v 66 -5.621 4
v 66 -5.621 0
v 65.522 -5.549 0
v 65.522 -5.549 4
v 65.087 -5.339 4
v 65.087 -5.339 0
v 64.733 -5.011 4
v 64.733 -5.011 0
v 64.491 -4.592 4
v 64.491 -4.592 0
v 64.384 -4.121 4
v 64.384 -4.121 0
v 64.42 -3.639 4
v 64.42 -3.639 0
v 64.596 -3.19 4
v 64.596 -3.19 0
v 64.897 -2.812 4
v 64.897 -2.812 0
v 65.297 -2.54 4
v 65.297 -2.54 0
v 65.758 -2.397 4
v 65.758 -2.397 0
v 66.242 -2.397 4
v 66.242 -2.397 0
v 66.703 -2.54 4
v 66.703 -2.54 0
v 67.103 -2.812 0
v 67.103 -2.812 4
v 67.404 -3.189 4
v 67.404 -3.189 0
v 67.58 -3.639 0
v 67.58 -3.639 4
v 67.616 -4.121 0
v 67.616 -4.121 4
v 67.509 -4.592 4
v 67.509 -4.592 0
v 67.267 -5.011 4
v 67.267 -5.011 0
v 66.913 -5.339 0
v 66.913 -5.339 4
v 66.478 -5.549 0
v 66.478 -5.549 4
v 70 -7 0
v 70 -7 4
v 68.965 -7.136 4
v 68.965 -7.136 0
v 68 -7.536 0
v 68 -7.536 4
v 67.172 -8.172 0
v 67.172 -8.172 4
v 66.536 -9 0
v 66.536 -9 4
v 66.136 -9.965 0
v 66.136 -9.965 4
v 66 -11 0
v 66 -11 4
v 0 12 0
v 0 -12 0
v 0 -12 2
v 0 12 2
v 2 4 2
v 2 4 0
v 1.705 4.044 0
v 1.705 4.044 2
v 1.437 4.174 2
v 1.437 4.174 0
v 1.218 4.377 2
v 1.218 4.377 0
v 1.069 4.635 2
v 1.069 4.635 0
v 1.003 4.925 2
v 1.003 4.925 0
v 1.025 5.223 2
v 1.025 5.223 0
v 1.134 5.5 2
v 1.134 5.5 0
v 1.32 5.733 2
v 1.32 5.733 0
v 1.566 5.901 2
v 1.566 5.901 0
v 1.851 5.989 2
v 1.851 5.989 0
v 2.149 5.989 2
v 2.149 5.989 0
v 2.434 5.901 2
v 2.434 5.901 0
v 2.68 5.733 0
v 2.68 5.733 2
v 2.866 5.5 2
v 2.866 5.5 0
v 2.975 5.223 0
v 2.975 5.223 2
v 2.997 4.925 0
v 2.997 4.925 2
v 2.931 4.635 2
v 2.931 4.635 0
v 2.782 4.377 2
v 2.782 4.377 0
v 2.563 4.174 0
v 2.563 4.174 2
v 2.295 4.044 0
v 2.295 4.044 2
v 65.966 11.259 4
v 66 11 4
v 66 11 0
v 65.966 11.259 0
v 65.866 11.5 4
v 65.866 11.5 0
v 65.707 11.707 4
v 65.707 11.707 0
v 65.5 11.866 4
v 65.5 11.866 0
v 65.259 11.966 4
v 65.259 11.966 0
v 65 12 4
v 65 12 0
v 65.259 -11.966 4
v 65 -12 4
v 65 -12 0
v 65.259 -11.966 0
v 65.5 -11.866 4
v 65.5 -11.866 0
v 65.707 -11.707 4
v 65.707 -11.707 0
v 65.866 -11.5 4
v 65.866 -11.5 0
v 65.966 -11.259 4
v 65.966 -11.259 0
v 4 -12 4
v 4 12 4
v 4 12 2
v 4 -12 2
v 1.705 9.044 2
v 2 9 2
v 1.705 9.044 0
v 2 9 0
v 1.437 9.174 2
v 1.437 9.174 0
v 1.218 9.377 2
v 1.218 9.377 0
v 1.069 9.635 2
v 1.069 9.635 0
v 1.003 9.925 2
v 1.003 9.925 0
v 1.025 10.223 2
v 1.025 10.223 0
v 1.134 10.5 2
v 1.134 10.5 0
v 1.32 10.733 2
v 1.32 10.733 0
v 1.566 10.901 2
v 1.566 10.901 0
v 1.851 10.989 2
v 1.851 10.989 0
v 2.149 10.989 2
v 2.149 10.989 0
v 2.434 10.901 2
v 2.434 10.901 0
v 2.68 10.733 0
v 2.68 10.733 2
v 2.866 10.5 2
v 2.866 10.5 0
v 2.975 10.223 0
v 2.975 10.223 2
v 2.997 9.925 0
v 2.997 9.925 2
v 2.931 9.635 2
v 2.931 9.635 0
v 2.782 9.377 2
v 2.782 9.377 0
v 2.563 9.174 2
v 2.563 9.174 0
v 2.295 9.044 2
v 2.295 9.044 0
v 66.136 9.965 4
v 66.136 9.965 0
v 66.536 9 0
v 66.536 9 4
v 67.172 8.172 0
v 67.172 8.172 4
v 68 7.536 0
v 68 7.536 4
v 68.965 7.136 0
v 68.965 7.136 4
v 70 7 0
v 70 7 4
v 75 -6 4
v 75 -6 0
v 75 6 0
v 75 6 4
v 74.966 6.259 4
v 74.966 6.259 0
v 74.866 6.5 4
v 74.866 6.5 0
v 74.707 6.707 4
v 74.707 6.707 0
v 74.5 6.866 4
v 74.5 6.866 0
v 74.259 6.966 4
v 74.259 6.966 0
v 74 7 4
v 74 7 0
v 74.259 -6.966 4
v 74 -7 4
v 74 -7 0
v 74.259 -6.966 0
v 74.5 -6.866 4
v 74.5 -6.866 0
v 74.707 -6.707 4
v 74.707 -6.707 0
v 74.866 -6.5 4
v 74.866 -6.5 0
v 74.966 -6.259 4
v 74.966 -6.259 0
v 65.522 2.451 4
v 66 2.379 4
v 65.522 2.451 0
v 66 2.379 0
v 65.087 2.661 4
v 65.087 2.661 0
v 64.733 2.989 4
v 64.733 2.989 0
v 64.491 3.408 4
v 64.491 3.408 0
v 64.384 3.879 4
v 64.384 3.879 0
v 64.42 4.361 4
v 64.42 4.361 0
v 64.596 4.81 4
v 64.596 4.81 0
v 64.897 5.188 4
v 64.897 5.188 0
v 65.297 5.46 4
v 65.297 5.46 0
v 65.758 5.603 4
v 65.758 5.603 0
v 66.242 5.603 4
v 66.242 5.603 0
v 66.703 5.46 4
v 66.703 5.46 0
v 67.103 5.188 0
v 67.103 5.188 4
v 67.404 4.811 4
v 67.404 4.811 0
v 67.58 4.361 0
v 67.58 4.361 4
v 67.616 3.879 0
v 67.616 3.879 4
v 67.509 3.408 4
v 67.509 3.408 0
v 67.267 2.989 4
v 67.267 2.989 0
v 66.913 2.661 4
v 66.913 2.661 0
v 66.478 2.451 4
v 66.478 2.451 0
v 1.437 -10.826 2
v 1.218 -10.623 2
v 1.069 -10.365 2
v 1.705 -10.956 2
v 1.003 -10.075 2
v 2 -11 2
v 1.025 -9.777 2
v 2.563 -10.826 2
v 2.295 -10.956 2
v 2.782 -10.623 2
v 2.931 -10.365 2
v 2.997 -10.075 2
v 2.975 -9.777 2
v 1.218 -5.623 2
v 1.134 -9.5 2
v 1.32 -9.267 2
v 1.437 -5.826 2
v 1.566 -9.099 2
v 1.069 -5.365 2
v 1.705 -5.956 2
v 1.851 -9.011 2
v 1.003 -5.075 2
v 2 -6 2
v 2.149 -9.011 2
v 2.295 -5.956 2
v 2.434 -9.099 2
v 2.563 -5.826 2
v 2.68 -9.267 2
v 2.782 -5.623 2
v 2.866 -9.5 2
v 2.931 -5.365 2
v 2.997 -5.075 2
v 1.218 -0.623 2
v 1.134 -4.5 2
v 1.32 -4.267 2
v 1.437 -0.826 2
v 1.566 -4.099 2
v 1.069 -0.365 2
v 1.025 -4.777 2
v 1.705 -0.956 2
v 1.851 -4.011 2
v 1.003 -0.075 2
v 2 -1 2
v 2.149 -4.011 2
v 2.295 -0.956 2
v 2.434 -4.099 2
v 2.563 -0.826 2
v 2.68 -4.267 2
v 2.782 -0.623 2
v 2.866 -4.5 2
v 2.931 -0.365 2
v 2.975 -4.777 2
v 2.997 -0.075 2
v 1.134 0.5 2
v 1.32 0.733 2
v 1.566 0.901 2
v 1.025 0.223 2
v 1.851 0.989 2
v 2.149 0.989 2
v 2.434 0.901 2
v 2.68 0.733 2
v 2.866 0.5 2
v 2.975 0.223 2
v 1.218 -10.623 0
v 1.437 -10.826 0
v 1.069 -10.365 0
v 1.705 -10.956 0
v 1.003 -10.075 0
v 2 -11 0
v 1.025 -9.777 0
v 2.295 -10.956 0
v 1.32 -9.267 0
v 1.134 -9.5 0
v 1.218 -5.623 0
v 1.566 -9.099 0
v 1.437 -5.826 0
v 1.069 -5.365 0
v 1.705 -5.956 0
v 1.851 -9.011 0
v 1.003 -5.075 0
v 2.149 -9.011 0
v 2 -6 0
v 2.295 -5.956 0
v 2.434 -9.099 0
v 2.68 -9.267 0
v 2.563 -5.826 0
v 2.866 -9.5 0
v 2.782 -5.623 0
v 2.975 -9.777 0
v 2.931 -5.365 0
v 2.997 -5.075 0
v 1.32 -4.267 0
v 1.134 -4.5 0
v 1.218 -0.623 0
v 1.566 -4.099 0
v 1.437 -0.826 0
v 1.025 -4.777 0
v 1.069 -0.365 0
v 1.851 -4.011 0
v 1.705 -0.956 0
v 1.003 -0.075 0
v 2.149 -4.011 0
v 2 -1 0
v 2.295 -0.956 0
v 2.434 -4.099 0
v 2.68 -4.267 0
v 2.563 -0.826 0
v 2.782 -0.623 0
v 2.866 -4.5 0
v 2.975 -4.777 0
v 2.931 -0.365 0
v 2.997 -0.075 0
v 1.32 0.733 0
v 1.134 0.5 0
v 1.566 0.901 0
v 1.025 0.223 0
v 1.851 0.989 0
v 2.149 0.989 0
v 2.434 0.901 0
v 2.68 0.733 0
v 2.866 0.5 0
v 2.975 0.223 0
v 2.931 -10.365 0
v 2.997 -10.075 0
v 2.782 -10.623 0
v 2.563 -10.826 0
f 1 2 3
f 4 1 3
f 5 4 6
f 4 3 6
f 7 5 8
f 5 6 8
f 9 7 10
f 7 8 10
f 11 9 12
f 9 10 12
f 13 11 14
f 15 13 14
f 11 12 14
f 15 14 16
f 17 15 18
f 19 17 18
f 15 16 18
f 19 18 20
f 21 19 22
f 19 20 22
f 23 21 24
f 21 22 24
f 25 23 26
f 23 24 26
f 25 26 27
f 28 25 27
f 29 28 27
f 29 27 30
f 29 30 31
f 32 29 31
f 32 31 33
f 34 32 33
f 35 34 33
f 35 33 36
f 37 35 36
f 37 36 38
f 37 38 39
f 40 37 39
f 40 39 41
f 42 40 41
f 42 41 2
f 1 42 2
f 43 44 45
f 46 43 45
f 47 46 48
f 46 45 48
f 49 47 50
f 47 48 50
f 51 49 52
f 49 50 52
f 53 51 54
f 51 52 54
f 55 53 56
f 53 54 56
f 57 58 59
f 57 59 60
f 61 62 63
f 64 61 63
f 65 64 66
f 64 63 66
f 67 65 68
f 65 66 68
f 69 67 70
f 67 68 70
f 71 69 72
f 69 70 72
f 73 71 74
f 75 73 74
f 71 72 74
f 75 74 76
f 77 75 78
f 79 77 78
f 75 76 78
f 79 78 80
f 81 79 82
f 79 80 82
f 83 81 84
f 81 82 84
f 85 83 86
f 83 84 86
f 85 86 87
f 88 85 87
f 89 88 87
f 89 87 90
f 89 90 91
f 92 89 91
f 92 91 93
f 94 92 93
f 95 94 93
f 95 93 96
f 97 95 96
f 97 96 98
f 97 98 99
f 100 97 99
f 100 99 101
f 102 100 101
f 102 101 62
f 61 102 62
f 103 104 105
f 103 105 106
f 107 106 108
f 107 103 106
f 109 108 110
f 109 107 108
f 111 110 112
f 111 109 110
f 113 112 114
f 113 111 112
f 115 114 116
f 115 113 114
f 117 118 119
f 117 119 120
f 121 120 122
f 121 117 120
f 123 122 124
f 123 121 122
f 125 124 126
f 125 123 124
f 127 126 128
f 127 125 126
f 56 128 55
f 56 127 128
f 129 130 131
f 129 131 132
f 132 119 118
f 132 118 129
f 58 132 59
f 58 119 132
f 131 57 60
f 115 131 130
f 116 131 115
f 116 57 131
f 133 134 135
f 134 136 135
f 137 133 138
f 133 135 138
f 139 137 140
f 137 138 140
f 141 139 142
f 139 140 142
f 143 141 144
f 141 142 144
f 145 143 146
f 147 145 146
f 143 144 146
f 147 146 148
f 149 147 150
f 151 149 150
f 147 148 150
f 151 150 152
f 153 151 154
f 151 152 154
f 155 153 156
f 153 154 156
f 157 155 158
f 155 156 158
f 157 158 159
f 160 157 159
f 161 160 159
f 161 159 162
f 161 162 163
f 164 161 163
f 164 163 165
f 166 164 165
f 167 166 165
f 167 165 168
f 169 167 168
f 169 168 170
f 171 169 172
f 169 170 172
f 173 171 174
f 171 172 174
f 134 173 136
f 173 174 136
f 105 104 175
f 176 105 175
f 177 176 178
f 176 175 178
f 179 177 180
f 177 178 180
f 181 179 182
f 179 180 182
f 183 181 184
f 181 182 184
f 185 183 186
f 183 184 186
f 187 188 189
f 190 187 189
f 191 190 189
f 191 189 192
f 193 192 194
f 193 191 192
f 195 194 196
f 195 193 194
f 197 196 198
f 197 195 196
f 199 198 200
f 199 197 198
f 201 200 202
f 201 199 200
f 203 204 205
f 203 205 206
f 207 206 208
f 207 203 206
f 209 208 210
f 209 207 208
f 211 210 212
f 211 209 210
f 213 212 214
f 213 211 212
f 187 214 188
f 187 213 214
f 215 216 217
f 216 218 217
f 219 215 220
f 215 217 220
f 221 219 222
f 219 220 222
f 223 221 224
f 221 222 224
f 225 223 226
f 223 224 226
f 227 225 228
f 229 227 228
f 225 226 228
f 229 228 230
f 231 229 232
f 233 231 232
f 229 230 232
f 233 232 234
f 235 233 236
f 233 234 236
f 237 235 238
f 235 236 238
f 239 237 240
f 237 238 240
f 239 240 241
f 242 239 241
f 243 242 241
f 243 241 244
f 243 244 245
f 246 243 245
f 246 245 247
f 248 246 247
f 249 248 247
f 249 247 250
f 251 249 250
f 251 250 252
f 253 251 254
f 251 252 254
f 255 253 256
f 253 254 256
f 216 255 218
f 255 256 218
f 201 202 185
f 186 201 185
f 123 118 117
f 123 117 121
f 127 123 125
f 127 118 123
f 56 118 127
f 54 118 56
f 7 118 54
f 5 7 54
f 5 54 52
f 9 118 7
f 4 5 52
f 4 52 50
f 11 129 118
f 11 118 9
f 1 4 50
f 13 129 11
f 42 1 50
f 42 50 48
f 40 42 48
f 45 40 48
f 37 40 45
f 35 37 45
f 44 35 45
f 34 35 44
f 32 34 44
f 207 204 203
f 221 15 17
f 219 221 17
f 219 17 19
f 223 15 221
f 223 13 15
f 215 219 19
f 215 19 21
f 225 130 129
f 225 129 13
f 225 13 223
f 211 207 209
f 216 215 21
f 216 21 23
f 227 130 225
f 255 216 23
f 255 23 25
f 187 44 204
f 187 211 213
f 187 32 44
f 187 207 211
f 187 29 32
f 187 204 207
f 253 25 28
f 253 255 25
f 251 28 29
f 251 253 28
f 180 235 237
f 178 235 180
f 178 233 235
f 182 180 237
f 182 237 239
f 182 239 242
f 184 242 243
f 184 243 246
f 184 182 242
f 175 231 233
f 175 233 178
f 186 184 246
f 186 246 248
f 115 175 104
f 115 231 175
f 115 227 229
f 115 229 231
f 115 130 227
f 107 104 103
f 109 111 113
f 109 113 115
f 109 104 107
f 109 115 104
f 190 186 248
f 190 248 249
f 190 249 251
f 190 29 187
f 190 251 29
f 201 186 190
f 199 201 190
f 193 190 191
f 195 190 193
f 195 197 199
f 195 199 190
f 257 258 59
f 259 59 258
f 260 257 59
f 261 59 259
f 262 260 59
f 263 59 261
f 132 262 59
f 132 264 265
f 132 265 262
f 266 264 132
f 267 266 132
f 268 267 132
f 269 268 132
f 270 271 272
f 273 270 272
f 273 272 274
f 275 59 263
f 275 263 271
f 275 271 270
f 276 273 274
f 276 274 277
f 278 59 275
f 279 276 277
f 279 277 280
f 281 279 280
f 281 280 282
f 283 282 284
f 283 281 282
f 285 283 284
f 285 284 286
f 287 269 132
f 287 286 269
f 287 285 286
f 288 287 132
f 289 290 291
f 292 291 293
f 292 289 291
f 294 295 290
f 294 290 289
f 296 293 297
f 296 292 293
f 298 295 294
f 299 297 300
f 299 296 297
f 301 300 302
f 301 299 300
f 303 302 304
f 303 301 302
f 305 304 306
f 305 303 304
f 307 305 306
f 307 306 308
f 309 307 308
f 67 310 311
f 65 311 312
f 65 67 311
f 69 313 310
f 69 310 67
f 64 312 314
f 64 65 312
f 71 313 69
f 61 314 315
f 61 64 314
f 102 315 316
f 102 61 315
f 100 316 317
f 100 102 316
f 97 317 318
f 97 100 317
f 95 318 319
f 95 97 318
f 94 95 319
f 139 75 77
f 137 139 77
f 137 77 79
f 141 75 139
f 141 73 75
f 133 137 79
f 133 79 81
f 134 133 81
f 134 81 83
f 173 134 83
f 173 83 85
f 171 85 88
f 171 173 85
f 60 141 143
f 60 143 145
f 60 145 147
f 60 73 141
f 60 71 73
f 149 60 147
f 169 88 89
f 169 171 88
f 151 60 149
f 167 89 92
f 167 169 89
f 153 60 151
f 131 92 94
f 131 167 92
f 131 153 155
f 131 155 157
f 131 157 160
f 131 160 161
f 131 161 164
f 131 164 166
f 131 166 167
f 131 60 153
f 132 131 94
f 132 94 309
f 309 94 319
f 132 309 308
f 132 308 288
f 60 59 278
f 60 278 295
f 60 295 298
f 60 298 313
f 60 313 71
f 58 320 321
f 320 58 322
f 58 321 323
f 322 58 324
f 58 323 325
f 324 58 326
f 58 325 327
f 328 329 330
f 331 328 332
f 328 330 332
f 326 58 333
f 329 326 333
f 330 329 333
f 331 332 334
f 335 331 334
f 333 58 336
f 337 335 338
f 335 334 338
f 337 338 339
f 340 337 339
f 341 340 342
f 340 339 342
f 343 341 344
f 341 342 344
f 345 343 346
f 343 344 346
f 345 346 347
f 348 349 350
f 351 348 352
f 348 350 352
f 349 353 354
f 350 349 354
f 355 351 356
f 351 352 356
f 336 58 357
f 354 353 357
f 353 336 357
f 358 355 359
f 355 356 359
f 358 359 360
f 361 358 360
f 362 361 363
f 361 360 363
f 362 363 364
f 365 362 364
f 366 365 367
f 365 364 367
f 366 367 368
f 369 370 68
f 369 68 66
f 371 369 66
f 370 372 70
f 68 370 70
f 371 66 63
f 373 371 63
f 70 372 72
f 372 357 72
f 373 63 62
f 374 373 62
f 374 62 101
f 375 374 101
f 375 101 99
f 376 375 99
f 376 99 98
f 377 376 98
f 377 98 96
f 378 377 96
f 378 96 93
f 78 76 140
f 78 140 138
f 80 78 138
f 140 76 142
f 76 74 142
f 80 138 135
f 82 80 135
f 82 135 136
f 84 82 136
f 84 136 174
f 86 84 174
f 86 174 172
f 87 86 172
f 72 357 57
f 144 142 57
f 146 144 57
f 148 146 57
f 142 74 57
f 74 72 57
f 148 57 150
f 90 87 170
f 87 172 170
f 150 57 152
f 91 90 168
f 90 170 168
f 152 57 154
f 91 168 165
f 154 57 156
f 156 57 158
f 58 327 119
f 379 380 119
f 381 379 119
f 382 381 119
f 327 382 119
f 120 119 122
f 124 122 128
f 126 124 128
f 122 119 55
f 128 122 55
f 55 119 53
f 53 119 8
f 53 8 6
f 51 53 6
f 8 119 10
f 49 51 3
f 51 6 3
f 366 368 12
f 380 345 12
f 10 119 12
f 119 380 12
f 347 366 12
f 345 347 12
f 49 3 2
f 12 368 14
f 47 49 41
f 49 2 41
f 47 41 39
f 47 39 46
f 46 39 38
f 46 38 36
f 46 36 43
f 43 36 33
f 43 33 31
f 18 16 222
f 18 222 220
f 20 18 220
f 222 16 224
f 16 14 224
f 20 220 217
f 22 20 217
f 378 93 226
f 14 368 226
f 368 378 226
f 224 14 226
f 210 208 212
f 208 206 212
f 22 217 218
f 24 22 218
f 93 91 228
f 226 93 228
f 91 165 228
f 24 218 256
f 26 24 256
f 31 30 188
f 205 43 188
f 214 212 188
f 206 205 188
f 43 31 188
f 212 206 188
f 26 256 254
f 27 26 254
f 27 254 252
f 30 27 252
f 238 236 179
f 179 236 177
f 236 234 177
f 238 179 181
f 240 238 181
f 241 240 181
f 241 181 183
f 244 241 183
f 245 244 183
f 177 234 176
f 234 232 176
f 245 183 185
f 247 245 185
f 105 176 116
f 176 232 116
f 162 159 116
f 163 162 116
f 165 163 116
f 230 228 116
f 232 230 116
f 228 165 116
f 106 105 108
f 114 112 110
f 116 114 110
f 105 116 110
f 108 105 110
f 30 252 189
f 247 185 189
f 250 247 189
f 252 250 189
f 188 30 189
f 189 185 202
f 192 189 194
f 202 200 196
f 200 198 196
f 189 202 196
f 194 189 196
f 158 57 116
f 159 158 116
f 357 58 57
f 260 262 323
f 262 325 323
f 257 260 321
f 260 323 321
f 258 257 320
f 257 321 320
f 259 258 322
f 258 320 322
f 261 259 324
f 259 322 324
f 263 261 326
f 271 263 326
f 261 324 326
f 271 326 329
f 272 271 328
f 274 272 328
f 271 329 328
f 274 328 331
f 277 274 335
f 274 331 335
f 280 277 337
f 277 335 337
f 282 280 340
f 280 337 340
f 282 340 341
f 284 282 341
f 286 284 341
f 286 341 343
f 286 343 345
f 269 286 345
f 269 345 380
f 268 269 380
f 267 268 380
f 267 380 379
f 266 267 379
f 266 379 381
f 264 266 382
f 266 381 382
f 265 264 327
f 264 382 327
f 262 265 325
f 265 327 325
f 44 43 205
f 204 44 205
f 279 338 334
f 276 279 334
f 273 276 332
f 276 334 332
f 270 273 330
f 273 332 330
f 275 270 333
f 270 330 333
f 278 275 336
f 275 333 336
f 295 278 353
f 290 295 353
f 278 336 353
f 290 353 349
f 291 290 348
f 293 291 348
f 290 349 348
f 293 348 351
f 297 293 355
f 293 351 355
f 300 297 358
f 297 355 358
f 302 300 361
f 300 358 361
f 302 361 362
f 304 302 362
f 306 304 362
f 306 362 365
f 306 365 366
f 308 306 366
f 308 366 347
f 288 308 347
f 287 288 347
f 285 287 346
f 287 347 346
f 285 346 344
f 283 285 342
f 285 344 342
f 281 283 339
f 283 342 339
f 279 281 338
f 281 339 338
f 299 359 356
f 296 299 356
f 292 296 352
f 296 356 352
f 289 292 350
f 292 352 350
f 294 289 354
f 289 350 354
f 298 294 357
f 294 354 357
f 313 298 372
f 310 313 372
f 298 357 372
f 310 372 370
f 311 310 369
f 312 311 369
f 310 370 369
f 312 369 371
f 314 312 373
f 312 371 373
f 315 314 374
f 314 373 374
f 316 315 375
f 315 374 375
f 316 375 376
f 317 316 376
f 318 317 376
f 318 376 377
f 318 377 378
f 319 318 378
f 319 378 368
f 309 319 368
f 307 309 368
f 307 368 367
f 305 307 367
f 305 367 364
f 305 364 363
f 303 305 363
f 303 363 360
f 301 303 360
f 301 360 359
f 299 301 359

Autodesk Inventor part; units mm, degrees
ref_plane "YZ Plane" through (0, 0, 0) normal (1, 0, 0) x (0, 1, 0)
ref_plane "XZ Plane" through (0, 0, 0) normal (0, 1, 0) x (-1, 0, 0)
ref_plane "XY Plane" through (0, 0, 0) normal (0, 0, 1) x (1, 0, 0)
sketch "Skizze1" plane through (0, 0, 0) normal (0, 0, 1) x (1, 0, 0)
  line L0 (0, 12) -> (66, 12)
  line L1 (66, -12) -> (0, -12)
  line L2 (0, -12) -> (0, 12)
  line L3 (-15, 0) -> (90, 0) projected
  line L4 (66, -7) -> (75, -7)
  line L5 (75, -7) -> (75, 7)
  line L6 (75, 7) -> (66, 7)
  line L7 (66, 12) -> (66, 7)
  line L8 (66, -7) -> (66, -12)
  point P0 (0, 0)
  dimension "d0" = 24
  dimension "d1" = 66
  dimension "d29" = 14
  dimension "d30" = 9
extrude "Extrusion1" add sketch "Skizze1" along normal blind 4
sketch "Skizze2" plane through (0, 0, 4) normal (0, 0, 1) x (1, 0, 0)
  line L0 (66, 12) -> (0, 12) projected
  line L1 (0, 12) -> (0, -12) projected
  line L2 (0, 12) -> (4, 12)
  line L3 (4, 12) -> (4, -12)
  line L4 (4, -12) -> (0, -12)
  line L5 (0, -12) -> (0, 12)
  point P0 (0, 0)
  dimension "d4" = 4
extrude "Extrusion2" cut sketch "Skizze2" against normal blind 2
sketch "Skizze3" plane through (0, 0, 2) normal (0, 0, 1) x (1, 0, 0)
  line L0 (0, 16.8) -> (0, -16.8) projected
  line L1 (-15, 0) -> (90, 0) projected
  point P0 (0, 0)
  point P1 (2, 0)
  dimension "d7" = 2
hole "Bohrung1" at (2, 0, 2) direction (0, 0, -1) diameter 2 end through all
pattern_linear "Rechteckige Anordnung1" count 5 spacing 5 along (0, 1, 0) of "Bohrung1" first direction both ways yes
sketch "Skizze4" plane through (0, 0, 4) normal (0, 0, 1) x (1, 0, 0)
  line L0 (-15, 0) -> (90, 0) projected
  line L1 (66, -12) -> (66, 12) projected
  line L2 (75, -7) -> (75, 7) construction
  point P0 (0, 0)
  point P1 (66, 4)
  point P2 (66, -4)
  dimension "d31" = 8
  dimension "d36" = 0
hole "Bohrung2" at (66, -4, 4) at (66, 4, 4) direction (0, 0, -1) diameter 3.242 end through all thread size "M4x0.7" class "6H" standard "ISO Metric profile"
fillet "Rundung1" radius 4 2 edges at (66, -7, 2) (66, 7, 2)
fillet "Rundung2" radius 1 4 edges at (66, -12, 2) (66, 12, 2) (75, -7, 2) (75, 7, 2)
properties part number "Kicker Eisen" material "Stahl, unlegiert"
